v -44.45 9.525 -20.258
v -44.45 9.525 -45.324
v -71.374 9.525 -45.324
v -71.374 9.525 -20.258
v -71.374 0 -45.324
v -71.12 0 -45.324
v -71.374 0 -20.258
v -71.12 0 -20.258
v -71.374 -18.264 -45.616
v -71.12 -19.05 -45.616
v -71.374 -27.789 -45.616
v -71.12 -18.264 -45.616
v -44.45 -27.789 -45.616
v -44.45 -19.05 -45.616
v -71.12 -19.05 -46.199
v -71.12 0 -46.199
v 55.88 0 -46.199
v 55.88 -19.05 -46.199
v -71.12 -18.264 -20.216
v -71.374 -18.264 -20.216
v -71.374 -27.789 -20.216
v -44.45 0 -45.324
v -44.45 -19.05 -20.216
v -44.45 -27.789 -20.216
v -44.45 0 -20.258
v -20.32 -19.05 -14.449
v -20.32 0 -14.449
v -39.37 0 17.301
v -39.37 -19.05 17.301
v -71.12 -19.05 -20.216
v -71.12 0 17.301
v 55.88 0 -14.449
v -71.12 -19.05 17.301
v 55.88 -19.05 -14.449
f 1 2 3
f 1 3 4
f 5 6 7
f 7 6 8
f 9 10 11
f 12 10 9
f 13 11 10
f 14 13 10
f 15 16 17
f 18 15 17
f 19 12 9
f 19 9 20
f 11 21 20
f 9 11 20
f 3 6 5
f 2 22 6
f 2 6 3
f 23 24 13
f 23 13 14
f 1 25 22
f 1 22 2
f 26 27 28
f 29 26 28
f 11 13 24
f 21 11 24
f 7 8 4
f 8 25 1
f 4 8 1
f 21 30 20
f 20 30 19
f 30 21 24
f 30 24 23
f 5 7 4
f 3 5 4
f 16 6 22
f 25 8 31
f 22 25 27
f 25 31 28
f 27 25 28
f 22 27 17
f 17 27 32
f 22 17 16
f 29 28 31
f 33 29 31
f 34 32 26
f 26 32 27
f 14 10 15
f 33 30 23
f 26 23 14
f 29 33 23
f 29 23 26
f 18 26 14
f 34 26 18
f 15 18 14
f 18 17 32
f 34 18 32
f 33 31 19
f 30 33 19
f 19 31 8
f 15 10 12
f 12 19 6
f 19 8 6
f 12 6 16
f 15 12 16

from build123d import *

# Parameters (mm, degrees)
F1_DEPTH = 19.05
F3_START = -44.45
F2_W     = 9.525
F2_H     = 25.4
F2_H_2   = 25.0668842345
F3_DEPTH = 26.924


with BuildPart() as f1:
    # F0 (on Front) → F1 (new body)
    with BuildSketch(Plane.XZ):
        Polygon((-71.1200013757, 17.3011439145), (-71.1200013757, -46.1988560855), (55.8799986243, -46.1988560855), (55.8799986243, -14.4488560855), (-20.3200013757, -14.4488560855), (-39.3700013757, 17.3011439145), align=None)
    extrude(amount=F1_DEPTH)

    # F2 (on Right) → F3 (join)
    with BuildSketch(Plane.YZ.offset(F3_START)):
        with Locations((-23.0265576392, -32.9159003079)):
            Rectangle(F2_W, F2_H)
        with Locations((4.7625, -32.7909840271)):
            Rectangle(F2_W, F2_H_2)
    extrude(amount=-F3_DEPTH)


solid = f1.part
